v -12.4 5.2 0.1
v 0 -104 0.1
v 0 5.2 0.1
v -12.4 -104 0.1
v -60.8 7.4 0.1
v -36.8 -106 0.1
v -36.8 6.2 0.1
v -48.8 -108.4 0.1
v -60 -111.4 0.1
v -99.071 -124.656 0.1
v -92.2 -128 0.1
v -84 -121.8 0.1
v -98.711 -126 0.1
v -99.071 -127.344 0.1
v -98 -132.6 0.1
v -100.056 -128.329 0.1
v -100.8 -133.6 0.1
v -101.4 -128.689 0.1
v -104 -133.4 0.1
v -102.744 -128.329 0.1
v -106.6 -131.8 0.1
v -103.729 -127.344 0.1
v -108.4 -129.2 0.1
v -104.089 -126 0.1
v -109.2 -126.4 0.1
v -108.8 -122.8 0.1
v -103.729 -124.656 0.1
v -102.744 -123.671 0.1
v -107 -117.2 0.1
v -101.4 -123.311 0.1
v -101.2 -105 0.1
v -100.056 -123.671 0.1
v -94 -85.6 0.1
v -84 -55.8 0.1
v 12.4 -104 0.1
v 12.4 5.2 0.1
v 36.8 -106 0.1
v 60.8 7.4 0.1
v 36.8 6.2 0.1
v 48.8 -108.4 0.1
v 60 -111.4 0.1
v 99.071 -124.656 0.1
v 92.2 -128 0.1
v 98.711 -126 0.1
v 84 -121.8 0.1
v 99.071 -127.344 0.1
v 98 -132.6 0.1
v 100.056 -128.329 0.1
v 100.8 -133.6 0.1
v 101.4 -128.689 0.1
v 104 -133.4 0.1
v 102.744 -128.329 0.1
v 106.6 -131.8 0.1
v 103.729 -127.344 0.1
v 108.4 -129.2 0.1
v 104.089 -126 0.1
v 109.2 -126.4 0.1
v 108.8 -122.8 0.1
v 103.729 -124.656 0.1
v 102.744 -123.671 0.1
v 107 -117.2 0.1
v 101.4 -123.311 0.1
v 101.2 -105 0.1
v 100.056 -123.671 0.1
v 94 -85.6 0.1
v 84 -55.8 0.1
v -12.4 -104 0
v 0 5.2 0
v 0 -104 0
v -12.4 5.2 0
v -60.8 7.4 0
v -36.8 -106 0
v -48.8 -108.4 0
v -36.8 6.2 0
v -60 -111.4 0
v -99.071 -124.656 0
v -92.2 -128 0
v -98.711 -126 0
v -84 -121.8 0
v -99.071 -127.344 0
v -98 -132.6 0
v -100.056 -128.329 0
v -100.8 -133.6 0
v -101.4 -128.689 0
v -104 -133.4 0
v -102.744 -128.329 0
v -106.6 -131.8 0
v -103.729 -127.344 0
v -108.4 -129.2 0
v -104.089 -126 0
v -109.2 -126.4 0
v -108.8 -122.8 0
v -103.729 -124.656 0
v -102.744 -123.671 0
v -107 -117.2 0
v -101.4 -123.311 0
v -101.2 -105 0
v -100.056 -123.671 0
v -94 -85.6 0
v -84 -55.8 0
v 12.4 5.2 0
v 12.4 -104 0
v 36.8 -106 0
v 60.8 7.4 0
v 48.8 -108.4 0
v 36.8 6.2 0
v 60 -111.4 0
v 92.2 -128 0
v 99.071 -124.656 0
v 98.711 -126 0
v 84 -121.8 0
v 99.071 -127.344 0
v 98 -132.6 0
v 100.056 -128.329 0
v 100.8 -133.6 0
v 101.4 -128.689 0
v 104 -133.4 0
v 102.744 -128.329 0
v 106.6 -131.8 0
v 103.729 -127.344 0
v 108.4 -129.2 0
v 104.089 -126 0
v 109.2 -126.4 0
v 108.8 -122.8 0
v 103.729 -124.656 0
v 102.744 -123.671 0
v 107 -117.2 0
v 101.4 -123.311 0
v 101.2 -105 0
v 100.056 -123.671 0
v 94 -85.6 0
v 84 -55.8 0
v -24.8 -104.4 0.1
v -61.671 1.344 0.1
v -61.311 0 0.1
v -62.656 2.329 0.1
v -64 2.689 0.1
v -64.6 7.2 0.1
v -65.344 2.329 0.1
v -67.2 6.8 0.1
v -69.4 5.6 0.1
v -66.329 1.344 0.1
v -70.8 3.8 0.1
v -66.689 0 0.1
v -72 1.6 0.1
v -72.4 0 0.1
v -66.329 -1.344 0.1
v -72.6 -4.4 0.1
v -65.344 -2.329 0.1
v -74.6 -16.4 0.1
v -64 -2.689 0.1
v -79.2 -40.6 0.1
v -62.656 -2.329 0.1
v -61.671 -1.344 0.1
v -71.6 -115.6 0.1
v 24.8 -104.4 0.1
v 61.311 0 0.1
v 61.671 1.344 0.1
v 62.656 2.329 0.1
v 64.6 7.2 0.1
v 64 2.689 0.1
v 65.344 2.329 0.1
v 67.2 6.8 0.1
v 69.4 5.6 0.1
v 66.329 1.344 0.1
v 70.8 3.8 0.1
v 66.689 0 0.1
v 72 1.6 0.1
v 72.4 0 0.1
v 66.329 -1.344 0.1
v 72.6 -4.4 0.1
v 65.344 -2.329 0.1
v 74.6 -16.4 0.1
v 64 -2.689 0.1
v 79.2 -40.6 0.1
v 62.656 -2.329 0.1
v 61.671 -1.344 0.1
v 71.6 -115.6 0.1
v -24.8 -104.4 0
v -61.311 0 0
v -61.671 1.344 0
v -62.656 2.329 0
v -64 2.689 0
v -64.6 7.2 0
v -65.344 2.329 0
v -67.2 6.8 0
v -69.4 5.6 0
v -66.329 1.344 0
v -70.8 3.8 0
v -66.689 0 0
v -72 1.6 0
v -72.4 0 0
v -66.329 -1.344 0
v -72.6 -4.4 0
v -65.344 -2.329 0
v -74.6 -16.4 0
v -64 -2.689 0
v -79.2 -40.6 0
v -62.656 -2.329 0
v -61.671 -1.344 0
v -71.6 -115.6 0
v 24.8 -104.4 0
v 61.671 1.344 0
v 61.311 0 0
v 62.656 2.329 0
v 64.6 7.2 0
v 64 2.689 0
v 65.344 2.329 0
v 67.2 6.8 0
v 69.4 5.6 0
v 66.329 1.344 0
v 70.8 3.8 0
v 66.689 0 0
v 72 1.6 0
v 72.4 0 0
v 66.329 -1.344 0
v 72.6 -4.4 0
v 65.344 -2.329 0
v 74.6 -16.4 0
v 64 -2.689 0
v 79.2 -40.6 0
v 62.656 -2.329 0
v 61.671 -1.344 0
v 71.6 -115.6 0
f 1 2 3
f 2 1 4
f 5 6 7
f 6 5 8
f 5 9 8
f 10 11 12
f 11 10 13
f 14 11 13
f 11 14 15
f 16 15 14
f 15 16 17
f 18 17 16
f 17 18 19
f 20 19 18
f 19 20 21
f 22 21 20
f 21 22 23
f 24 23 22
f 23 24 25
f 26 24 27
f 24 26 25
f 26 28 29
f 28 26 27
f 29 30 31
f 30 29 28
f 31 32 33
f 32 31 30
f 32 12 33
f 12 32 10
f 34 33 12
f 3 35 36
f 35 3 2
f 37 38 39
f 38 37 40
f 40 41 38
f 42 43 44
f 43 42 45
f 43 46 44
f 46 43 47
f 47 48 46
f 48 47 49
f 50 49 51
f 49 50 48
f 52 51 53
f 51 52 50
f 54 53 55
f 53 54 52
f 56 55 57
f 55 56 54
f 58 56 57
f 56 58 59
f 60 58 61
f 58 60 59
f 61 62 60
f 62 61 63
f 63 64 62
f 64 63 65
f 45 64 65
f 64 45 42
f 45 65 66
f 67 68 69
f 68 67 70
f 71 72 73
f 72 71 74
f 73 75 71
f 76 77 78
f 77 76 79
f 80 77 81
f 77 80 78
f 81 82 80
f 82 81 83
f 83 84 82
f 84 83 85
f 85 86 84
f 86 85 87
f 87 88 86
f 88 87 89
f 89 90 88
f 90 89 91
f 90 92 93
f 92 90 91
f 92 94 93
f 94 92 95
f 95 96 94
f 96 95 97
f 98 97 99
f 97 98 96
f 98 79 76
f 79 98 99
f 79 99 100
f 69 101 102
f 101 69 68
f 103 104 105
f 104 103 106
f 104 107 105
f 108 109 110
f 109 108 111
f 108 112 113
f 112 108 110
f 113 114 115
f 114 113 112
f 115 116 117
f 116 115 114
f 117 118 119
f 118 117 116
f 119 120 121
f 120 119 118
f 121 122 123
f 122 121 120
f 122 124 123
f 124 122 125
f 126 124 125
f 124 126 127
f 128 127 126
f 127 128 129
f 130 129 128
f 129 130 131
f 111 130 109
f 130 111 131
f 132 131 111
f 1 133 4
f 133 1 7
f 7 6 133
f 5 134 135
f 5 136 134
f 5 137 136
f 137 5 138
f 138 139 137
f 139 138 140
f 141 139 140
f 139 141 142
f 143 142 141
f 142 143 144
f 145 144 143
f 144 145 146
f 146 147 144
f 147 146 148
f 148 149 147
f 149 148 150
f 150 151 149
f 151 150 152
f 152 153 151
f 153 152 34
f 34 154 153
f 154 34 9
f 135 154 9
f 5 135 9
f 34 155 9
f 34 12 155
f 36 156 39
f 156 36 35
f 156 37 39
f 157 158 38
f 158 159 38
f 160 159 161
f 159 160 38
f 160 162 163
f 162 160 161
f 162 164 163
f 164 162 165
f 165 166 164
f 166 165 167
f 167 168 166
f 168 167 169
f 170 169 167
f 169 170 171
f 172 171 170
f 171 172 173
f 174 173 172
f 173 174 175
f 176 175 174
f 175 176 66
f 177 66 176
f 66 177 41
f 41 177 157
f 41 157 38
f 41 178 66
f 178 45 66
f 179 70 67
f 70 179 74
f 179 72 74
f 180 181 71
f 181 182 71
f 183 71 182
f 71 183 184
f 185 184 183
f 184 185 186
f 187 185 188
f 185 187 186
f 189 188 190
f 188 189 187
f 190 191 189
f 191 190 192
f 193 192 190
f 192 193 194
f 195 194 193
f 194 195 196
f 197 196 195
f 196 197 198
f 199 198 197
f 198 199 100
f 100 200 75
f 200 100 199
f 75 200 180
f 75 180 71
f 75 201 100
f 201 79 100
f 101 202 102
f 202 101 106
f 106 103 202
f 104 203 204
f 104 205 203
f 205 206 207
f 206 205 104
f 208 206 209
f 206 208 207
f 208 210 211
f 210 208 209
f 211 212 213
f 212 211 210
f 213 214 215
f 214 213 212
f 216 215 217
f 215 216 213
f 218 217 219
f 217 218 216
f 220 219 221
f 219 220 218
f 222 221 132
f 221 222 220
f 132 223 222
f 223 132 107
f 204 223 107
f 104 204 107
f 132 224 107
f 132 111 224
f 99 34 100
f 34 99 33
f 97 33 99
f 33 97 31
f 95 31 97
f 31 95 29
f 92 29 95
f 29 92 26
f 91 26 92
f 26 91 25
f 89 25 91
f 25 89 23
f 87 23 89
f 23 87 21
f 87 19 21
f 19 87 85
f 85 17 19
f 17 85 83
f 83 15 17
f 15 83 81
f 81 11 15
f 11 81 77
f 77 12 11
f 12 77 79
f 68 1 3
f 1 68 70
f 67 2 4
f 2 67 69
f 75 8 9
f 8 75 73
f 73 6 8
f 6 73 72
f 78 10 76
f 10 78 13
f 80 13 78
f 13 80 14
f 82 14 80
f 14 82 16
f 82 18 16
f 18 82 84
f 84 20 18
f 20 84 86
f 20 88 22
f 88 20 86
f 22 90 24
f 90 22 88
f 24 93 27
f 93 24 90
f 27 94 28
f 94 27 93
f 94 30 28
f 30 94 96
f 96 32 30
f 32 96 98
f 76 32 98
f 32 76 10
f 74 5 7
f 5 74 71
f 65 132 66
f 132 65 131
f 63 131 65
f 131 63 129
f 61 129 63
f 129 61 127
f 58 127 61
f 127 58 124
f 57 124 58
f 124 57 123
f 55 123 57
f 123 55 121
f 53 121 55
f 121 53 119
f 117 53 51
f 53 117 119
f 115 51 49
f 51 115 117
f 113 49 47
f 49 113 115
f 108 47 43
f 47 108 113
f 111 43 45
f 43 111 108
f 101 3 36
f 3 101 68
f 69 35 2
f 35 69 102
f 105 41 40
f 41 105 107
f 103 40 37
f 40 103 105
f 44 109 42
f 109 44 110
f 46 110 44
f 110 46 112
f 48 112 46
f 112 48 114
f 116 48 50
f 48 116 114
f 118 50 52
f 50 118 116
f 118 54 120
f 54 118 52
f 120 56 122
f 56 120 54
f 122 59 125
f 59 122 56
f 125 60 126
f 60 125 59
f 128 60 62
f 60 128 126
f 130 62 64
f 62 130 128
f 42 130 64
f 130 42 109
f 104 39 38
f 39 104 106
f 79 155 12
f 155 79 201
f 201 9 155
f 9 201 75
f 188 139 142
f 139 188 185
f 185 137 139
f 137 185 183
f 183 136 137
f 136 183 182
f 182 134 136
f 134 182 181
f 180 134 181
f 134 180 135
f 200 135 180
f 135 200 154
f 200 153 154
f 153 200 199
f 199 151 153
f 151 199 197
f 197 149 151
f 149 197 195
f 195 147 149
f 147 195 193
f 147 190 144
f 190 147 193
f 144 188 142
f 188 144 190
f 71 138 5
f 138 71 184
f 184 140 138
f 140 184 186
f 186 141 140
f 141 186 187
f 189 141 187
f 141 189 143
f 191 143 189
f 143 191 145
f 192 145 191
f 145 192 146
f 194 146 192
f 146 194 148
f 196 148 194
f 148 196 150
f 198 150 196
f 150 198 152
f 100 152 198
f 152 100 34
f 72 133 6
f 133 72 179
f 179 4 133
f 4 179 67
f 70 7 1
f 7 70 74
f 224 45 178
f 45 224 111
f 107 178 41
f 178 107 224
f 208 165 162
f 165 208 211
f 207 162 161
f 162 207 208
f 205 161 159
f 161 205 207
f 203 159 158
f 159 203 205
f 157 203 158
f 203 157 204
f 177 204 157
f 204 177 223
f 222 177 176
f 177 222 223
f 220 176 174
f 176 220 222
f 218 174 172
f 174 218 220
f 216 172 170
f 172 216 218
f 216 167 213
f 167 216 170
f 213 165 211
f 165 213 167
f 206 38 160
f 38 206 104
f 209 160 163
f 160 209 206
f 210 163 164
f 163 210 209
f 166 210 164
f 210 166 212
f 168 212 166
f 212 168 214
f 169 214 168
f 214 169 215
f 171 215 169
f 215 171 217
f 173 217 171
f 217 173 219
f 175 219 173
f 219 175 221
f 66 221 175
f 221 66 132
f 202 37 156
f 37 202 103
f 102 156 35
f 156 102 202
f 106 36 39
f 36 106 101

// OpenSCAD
use <../lib.scad>
use <s/u9494s01.scad>
use <s/u9494s02.scad>
use <s/u9494s03.scad>
use <s/u9494s04.scad>
$fa=1; $fs=0.2;
function ldraw_lib__u9494(realsolid=false) = [
// 0 Sail 27 x 17 Trapezoidal
// 0 Name: u9494.dat
// 0 Author: Philippe Hurbain [Philo]
// 0 !LDRAW_ORG Part UPDATE 2020-03
// 0 !LICENSE Licensed under CC BY 2.0 and CC BY 4.0 : see CAreadme.txt
// 
// 0 BFC CERTIFY CCW
  [0,"BFC","CERTIFY"],
  [0,"BFC","CCW"],
// 
// 0 !CATEGORY Sheet Fabric
// 
// 0 !HISTORY 2020-12-29 [PTadmin] Official Update 2020-03
// 
// 
// 1 16 0 -0.25 0 1 0 0 0 1 0 0 0 1 s\u9494s01.dat
  [1,16,0,-0.25,0,1,0,0,0,1,0,0,0,1, ldraw_lib__s__u9494s01(realsolid)],
// 1 16 0 -0.25 0 -1 0 0 0 1 0 0 0 1 s\u9494s01.dat
  [1,16,0,-0.25,0,-1,0,0,0,1,0,0,0,1, ldraw_lib__s__u9494s01(realsolid)],
// 1 16 0 0 0 1 0 0 0 -1 0 0 0 1 s\u9494s01.dat
  [1,16,0,0,0,1,0,0,0,-1,0,0,0,1, ldraw_lib__s__u9494s01(realsolid)],
// 1 16 0 0 0 -1 0 0 0 -1 0 0 0 1 s\u9494s01.dat
  [1,16,0,0,0,-1,0,0,0,-1,0,0,0,1, ldraw_lib__s__u9494s01(realsolid)],
// 
// 1 16 0 -0.25 0 1 0 0 0 1 0 0 0 1 s\u9494s02.dat
  [1,16,0,-0.25,0,1,0,0,0,1,0,0,0,1, ldraw_lib__s__u9494s02(realsolid)],
// 1 16 0 -0.25 0 -1 0 0 0 1 0 0 0 1 s\u9494s02.dat
  [1,16,0,-0.25,0,-1,0,0,0,1,0,0,0,1, ldraw_lib__s__u9494s02(realsolid)],
// 1 16 0 0 0 1 0 0 0 -1 0 0 0 1 s\u9494s02.dat
  [1,16,0,0,0,1,0,0,0,-1,0,0,0,1, ldraw_lib__s__u9494s02(realsolid)],
// 1 16 0 0 0 -1 0 0 0 -1 0 0 0 1 s\u9494s02.dat
  [1,16,0,0,0,-1,0,0,0,-1,0,0,0,1, ldraw_lib__s__u9494s02(realsolid)],
// 
// 1 16 0 0 0 1 0 0 0 1 0 0 0 1 s\u9494s03.dat
  [1,16,0,0,0,1,0,0,0,1,0,0,0,1, ldraw_lib__s__u9494s03(realsolid)],
// 1 16 0 0 0 -1 0 0 0 1 0 0 0 1 s\u9494s03.dat
  [1,16,0,0,0,-1,0,0,0,1,0,0,0,1, ldraw_lib__s__u9494s03(realsolid)],
// 
// 1 16 0 0 0 1 0 0 0 1 0 0 0 1 s\u9494s04.dat
  [1,16,0,0,0,1,0,0,0,1,0,0,0,1, ldraw_lib__s__u9494s04(realsolid)],
// 1 16 0 0 0 -1 0 0 0 1 0 0 0 1 s\u9494s04.dat
  [1,16,0,0,0,-1,0,0,0,1,0,0,0,1, ldraw_lib__s__u9494s04(realsolid)],
];
module ldraw_lib__u9494(step=0, col=false, unit=2/5, alt=false, line=0.2, solid=!$preview)
    makepoly(ldraw_lib__u9494(solid), step=step, col=col, unit=unit, alt=alt, line=line, solid=solid);
ldraw_lib__u9494(line=0.2);
